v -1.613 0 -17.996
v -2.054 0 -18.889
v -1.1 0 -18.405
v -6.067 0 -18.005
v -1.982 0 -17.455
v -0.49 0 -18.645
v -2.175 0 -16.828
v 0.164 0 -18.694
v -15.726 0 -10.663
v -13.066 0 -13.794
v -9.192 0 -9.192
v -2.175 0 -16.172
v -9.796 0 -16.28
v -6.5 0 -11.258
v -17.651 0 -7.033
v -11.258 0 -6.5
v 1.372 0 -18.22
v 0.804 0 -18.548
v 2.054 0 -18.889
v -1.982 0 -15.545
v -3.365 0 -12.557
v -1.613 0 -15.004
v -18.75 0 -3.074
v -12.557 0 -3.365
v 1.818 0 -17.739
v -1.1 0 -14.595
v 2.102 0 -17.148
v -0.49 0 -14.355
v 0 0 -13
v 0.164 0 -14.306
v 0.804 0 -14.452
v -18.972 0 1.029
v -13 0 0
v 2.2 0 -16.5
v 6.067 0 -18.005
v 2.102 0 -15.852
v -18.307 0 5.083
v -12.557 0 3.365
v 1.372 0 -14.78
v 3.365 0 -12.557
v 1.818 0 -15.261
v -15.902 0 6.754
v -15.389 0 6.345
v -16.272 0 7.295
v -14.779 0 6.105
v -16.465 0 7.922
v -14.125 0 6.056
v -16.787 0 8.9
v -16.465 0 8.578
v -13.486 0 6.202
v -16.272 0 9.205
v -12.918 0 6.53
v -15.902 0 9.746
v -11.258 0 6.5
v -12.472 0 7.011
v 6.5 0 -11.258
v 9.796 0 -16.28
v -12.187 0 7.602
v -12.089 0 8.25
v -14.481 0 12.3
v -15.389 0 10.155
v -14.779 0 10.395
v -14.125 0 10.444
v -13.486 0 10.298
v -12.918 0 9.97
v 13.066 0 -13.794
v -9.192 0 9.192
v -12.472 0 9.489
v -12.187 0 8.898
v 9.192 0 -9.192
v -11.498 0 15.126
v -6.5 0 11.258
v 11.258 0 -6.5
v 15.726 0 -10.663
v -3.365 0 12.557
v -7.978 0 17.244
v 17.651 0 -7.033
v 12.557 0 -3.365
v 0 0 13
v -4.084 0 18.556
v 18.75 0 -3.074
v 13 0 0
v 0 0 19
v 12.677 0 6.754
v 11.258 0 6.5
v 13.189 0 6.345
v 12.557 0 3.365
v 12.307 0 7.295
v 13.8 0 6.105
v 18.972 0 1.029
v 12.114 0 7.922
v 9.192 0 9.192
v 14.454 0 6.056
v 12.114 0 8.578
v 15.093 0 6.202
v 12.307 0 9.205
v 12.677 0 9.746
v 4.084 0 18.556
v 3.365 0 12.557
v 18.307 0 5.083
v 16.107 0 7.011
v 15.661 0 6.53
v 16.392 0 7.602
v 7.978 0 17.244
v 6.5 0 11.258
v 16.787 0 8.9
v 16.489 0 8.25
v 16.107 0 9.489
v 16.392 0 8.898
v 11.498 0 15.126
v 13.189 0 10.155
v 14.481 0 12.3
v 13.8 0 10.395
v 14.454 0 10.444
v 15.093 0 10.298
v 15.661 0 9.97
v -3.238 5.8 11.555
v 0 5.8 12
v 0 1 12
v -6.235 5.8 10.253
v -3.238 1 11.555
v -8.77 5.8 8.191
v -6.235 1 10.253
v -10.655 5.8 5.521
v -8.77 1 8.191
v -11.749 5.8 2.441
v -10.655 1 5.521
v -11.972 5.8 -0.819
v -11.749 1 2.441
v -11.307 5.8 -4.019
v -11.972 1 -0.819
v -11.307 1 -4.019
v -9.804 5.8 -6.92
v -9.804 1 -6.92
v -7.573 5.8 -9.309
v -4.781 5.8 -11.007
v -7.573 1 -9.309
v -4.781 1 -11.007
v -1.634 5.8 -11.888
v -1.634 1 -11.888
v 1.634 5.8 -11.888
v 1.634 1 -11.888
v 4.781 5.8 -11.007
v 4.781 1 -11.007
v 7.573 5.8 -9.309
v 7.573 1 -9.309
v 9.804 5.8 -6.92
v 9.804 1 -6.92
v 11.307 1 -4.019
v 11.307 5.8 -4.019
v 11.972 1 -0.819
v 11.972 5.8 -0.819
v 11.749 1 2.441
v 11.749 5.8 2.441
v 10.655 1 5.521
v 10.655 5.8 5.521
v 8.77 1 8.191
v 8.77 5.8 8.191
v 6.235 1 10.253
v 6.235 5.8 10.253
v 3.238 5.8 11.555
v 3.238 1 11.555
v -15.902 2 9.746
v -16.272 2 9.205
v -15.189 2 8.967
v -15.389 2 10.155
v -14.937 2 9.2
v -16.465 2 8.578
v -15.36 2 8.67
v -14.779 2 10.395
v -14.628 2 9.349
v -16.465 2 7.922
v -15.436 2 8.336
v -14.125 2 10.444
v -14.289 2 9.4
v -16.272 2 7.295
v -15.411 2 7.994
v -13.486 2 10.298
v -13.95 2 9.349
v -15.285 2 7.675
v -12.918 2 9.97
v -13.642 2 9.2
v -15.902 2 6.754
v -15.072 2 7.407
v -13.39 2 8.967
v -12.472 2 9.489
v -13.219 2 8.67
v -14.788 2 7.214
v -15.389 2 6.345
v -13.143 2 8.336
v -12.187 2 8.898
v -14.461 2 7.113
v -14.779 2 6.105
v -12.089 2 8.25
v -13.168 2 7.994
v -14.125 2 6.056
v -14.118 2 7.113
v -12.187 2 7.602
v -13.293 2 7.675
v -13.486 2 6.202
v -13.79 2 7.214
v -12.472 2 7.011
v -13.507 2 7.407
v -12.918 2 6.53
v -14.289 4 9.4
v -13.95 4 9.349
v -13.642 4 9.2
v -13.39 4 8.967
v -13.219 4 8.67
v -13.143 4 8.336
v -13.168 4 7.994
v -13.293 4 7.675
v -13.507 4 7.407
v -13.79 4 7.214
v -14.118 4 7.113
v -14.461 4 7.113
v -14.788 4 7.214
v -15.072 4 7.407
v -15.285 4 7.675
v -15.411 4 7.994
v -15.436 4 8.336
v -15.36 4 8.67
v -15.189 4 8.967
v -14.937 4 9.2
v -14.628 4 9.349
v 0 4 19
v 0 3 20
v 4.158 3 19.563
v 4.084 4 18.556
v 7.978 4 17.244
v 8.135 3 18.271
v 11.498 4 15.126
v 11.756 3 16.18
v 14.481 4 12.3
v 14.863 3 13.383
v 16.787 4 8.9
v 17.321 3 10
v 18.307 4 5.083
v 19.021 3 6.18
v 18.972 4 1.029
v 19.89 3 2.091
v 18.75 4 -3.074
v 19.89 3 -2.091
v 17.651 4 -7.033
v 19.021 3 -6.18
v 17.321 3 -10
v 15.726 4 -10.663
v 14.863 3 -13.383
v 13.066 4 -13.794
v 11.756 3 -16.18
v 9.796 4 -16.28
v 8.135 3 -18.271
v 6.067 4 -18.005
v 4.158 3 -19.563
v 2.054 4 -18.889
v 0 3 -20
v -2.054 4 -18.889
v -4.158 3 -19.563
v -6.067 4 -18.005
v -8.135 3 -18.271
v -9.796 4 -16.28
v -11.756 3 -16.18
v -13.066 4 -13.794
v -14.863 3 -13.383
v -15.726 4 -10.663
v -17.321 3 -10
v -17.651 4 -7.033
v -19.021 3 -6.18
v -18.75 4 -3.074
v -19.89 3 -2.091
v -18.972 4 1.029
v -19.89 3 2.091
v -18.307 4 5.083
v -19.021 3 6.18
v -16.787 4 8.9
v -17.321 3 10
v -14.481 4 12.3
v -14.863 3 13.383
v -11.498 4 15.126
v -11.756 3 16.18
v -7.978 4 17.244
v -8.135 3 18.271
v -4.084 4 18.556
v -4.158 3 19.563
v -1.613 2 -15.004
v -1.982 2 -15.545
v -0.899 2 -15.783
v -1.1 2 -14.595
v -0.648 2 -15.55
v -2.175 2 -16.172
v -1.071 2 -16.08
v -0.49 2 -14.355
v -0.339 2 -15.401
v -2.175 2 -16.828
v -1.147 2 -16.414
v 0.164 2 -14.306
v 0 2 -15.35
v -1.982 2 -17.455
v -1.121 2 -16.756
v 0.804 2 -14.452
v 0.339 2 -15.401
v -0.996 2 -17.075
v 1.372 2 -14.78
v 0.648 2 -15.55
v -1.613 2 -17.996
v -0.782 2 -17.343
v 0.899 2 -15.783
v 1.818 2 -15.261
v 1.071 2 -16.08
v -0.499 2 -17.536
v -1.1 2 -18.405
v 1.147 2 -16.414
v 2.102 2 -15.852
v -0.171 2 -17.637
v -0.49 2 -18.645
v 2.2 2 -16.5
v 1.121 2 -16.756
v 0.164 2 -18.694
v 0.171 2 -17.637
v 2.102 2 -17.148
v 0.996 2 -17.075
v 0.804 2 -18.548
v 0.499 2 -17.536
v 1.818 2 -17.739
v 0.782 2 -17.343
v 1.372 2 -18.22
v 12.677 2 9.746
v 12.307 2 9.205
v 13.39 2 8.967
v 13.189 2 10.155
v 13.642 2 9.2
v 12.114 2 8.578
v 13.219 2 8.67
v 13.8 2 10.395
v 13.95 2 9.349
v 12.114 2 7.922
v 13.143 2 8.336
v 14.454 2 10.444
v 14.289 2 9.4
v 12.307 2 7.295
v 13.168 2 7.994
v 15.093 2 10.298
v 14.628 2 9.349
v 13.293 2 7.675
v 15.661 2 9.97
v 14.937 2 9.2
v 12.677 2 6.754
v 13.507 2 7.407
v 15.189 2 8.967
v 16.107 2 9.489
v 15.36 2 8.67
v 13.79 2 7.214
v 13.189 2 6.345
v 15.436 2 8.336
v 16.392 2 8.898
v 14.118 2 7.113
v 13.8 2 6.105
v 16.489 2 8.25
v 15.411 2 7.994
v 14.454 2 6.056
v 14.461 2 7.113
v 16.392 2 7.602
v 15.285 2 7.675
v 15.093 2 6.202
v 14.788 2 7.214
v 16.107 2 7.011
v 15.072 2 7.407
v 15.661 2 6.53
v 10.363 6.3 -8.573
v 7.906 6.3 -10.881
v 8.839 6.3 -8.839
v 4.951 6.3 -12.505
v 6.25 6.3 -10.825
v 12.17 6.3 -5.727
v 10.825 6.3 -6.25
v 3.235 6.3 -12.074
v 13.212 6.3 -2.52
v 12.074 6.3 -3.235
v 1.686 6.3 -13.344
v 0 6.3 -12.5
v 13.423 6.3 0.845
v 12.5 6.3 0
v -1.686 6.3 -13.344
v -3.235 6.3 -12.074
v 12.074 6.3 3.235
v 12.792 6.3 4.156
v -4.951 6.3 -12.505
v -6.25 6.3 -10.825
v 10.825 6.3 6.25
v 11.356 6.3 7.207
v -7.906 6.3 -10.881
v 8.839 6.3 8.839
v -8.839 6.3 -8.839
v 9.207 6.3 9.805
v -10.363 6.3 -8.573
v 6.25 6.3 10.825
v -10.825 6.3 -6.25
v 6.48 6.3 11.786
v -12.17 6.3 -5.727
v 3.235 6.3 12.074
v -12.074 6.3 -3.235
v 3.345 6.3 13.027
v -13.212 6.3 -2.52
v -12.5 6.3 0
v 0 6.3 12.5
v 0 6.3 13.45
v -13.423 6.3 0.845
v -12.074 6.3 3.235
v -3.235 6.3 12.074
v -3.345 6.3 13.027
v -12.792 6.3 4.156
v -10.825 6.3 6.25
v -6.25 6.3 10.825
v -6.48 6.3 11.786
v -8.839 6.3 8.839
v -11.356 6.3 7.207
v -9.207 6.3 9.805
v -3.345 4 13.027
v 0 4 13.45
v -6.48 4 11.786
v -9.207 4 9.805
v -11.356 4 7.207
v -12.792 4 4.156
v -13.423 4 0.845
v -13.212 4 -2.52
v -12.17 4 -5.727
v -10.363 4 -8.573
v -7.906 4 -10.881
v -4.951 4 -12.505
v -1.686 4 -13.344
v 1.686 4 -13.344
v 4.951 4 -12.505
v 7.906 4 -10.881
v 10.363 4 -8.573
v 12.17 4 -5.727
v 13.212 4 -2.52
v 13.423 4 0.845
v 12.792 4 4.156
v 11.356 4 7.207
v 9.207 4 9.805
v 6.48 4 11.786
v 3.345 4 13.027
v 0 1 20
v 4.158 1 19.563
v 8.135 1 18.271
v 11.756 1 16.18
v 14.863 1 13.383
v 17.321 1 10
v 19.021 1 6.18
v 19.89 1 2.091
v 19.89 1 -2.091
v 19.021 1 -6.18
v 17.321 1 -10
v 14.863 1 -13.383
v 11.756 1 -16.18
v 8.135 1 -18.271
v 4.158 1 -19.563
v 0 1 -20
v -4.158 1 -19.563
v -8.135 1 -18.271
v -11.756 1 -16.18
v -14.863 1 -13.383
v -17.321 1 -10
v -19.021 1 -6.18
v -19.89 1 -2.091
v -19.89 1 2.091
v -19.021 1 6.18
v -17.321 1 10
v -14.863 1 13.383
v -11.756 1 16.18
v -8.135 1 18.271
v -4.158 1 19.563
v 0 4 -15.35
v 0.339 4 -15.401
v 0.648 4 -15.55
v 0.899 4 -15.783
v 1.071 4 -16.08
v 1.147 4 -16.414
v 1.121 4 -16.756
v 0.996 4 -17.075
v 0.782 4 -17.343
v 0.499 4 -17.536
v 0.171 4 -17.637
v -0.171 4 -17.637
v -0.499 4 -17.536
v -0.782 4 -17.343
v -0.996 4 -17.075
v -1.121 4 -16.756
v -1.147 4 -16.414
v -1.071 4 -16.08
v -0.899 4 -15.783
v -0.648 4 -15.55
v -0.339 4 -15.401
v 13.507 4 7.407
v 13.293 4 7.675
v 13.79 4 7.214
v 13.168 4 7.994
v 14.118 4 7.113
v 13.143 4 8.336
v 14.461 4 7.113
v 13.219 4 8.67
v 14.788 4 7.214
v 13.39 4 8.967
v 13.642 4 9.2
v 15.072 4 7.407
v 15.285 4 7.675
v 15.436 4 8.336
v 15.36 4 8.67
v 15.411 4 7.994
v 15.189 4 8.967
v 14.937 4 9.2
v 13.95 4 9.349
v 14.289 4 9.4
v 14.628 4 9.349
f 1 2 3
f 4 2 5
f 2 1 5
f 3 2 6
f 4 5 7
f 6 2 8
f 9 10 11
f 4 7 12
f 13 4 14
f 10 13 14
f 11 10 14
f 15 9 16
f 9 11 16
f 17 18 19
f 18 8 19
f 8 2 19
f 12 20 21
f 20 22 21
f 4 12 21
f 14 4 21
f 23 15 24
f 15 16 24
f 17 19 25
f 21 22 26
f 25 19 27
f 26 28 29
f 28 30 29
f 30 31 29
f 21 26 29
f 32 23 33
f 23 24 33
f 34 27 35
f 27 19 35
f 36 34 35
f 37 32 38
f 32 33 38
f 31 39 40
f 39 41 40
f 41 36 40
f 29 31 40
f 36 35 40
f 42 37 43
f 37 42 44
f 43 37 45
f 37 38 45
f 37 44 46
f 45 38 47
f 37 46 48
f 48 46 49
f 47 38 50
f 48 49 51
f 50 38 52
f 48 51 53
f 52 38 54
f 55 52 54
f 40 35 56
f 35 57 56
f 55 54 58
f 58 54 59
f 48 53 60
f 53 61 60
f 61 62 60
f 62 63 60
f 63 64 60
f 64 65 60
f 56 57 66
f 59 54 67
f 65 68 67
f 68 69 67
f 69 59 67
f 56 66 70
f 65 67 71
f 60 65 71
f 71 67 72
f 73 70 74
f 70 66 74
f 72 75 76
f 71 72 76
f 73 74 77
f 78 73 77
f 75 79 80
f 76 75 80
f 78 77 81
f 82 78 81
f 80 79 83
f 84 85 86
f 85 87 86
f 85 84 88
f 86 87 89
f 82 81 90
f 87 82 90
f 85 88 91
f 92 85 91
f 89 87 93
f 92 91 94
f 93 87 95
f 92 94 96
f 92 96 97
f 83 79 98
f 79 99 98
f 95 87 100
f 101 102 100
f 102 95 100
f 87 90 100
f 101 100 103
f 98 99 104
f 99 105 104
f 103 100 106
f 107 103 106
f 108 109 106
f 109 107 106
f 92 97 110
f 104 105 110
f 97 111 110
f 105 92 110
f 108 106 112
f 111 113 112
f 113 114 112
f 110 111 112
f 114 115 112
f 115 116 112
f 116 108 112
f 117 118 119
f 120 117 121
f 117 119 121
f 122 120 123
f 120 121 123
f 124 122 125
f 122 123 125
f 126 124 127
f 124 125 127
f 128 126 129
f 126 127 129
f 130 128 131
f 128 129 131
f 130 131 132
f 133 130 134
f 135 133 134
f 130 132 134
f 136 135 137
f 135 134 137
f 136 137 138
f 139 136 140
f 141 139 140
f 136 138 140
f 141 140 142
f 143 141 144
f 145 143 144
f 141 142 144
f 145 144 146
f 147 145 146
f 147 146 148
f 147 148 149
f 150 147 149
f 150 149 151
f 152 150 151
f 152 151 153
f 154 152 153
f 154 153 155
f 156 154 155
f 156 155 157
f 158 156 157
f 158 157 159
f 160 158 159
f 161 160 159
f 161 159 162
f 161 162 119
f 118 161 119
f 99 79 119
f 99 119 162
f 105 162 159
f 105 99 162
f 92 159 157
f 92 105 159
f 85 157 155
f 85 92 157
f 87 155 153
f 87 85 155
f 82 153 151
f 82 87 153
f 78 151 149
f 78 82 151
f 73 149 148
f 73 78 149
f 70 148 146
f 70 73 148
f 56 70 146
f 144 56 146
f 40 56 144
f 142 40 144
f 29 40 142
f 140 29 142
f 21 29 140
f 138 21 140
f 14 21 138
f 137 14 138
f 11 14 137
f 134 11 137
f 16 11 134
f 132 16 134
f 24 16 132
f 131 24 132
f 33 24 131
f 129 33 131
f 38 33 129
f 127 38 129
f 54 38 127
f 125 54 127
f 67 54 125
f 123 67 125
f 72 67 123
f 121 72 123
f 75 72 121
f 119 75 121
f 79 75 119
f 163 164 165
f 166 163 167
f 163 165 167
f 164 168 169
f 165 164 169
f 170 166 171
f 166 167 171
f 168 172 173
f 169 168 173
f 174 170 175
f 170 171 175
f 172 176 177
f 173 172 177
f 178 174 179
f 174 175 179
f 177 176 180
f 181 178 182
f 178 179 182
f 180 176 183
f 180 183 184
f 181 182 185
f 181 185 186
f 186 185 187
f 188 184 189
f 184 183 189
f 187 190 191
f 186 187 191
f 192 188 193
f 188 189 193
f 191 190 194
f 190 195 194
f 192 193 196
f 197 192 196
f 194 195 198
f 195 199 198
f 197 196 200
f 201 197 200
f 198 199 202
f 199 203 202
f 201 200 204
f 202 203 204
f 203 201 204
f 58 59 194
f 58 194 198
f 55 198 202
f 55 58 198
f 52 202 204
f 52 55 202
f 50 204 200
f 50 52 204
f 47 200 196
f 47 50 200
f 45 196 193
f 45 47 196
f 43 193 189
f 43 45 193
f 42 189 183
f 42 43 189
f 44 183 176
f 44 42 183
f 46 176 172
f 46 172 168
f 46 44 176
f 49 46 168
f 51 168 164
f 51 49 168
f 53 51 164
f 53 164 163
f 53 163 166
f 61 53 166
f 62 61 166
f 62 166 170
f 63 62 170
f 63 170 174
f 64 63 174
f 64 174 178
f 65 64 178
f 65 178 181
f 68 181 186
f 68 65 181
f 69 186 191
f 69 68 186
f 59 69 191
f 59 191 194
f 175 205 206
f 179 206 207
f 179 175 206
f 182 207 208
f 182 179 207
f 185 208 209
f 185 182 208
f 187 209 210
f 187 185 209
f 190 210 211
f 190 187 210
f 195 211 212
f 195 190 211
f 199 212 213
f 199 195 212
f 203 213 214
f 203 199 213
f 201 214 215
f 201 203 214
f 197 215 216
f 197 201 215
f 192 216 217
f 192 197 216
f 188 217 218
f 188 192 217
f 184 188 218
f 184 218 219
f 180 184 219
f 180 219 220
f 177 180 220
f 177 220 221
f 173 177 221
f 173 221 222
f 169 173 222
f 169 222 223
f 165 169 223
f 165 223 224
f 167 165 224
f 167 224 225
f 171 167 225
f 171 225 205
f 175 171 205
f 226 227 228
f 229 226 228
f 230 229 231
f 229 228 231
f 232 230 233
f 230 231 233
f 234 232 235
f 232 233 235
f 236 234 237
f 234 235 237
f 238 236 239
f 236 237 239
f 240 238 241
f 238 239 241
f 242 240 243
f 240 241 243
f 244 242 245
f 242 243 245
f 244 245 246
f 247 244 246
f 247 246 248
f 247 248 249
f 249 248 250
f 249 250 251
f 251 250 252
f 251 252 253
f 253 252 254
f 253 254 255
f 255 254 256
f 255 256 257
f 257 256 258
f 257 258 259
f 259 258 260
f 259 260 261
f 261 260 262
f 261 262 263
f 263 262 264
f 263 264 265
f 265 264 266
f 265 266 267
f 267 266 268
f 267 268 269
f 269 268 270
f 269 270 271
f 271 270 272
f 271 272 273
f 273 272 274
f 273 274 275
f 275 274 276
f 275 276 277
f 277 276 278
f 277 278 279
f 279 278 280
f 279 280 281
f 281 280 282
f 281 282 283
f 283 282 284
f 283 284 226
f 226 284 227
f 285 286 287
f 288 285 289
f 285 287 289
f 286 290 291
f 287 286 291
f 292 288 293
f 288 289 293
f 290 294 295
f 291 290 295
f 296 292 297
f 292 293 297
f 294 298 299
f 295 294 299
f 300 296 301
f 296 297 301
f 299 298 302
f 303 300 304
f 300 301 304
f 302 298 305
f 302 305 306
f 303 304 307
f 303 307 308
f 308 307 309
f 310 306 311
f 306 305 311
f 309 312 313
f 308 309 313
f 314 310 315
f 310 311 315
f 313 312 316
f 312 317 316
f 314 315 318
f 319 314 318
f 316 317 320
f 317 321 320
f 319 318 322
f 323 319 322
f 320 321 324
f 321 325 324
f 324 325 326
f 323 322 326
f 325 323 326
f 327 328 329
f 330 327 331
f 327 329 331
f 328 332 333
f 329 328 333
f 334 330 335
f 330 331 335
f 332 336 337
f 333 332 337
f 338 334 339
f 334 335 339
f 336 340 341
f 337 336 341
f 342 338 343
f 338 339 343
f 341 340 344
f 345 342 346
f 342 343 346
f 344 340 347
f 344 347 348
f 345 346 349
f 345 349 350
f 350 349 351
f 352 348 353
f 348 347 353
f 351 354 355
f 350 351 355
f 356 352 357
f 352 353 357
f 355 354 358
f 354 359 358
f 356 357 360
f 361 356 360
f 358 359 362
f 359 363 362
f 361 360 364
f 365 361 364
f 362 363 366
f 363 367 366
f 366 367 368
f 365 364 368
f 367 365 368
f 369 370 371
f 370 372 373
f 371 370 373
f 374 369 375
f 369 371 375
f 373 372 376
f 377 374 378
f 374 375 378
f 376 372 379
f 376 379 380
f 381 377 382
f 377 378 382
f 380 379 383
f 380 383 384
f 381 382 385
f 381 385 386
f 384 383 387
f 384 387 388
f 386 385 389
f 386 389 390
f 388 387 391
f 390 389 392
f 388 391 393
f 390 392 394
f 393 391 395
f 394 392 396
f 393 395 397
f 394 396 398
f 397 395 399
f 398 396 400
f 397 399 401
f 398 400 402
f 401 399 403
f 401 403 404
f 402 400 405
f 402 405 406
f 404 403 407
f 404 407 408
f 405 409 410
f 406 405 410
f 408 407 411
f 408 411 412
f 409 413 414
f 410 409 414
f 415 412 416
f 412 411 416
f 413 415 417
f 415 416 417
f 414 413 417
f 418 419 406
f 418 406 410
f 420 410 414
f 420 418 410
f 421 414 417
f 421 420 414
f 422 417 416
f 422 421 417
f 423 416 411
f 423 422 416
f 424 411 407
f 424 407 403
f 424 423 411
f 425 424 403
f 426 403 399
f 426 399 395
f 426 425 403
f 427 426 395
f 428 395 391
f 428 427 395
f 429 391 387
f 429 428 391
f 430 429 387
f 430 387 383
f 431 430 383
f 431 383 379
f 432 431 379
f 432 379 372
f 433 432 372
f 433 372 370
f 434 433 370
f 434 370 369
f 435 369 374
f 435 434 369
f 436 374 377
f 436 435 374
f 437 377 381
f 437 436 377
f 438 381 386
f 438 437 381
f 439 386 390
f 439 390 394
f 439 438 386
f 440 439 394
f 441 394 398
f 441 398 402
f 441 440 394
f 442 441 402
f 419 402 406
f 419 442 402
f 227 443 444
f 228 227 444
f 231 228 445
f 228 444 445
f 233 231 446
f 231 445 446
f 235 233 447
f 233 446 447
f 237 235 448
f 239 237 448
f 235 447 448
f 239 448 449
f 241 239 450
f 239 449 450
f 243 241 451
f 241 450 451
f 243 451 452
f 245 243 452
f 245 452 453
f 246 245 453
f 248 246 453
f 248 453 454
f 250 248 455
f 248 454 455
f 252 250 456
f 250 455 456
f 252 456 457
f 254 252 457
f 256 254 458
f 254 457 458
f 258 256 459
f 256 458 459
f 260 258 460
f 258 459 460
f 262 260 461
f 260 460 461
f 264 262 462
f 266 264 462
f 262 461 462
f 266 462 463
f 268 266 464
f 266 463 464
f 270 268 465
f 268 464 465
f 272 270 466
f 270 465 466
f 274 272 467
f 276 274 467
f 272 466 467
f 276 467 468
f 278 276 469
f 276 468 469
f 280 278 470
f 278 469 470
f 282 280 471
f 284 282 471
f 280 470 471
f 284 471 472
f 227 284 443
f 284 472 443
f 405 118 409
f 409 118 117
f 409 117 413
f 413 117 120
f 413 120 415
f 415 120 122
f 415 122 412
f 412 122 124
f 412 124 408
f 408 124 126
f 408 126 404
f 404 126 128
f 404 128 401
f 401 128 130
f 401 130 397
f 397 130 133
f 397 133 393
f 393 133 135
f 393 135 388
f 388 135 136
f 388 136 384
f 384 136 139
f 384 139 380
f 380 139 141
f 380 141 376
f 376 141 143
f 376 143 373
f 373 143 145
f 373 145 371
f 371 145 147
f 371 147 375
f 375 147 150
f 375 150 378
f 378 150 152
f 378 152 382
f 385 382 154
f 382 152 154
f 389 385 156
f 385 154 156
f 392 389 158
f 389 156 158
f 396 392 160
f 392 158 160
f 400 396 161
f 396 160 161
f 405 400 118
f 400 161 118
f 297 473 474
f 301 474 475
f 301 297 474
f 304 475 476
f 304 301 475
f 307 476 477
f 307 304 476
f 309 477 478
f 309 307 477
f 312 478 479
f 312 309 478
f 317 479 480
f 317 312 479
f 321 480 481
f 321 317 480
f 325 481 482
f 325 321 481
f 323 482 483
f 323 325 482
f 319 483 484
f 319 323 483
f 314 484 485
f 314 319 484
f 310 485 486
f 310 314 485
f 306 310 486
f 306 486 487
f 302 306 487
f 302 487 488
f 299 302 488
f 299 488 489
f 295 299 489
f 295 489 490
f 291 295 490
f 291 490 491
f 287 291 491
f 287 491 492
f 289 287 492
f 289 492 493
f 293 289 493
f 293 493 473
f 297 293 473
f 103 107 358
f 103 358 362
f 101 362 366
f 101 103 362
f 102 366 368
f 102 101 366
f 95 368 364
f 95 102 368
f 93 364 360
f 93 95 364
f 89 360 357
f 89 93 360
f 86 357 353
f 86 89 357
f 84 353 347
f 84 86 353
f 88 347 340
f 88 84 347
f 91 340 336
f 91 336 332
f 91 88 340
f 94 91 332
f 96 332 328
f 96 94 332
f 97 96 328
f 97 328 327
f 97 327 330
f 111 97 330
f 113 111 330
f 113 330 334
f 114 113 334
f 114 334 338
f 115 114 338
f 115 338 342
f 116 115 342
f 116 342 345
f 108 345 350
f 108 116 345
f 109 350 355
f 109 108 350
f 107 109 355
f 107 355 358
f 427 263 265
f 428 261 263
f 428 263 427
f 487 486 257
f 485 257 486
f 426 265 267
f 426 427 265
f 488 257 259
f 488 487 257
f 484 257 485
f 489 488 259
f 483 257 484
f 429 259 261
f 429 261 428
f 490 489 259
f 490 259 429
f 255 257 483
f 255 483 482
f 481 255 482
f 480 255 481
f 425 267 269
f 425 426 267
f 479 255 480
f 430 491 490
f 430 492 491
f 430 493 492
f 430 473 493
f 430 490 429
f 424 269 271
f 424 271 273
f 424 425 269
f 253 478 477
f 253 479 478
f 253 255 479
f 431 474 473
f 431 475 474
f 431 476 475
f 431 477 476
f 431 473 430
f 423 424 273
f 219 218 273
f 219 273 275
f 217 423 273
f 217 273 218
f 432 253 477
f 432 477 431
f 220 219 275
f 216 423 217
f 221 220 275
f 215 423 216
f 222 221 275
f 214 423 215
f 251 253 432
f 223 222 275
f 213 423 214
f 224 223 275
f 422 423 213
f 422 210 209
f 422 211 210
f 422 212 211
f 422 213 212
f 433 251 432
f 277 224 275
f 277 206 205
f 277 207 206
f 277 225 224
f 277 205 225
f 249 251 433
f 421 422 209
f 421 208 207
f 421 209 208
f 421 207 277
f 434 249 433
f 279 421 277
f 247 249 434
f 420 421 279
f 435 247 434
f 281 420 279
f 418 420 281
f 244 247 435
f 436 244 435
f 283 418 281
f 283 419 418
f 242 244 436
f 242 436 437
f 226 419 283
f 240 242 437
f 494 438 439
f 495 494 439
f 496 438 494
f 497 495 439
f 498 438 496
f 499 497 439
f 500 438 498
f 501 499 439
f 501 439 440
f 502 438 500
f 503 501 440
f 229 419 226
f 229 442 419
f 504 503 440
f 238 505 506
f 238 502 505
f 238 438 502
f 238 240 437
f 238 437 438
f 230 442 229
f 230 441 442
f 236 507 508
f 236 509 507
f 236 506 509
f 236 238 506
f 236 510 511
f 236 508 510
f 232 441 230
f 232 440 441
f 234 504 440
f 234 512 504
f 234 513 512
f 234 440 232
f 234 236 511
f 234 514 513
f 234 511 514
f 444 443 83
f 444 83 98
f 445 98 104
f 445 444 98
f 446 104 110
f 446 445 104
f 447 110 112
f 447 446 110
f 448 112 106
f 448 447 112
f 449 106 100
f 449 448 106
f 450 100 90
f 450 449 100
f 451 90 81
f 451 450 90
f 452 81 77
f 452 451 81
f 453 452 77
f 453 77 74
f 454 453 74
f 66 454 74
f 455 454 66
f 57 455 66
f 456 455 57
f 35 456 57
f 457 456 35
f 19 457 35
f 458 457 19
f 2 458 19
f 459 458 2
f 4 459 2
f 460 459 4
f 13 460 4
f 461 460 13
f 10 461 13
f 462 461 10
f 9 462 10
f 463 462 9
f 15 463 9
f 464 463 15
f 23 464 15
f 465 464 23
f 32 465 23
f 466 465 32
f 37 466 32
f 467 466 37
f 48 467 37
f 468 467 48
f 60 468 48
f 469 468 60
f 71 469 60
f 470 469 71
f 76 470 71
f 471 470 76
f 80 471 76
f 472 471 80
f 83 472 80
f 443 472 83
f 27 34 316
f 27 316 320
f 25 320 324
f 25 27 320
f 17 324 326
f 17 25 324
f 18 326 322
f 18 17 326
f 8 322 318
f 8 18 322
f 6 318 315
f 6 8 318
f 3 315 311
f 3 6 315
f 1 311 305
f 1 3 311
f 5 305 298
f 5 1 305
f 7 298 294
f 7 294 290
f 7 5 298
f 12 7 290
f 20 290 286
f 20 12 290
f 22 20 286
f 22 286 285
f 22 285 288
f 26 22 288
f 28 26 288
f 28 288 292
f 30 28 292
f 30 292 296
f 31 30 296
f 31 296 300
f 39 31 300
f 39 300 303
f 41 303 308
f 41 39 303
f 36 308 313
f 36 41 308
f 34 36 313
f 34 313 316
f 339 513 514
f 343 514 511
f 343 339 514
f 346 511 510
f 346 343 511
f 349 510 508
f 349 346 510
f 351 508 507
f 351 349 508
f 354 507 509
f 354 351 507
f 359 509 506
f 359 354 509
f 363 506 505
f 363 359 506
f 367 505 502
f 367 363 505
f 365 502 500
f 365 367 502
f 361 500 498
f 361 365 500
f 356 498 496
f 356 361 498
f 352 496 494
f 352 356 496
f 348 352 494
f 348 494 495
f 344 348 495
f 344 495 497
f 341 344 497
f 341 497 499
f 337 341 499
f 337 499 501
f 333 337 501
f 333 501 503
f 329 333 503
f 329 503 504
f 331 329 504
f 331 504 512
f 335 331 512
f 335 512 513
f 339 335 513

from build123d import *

# Parameters (mm, degrees)
ESQUISSE1_R                = 20
ESQUISSE1_R_2              = 12
ESQUISSE1_R_3              = 1.15
BOSS_EXTRU_1_DEPTH         = 4
PER_AGEAVANC_1_OUTLINE_R   = 2.2
PER_AGEAVANC_1_OUTLINE_R_2 = 1.15
PER_AGEAVANC_1_DEPTH       = 2
BOSS_EXTRU_2_START         = -4
ESQUISSE3_R                = 13.45
ESQUISSE3_R_2              = 12
BOSS_EXTRU_2_DEPTH         = 2.3
CHANFREIN1_SIZE            = 0.5
CHANFREIN2_SIZE            = 1


# Read off the part's stored shape, not the designer's step: PerçageAvancé1
with BuildPart() as part:
    # Esquisse1 → Boss.-Extru.1 (new body)
    with BuildSketch(Plane(origin=(0, 0, 0), x_dir=(1, 0, 0), z_dir=(0, 1, 0))):
        with Locations(Location((0, 0, 0), (0, 0, 270))):
            Circle(ESQUISSE1_R)
        with Locations(Location((0, 0, 0), (0, 0, 270))):
            Circle(ESQUISSE1_R_2, mode=Mode.SUBTRACT)
        with Locations(Location((-14.289419162, -8.25, 0), (0, 0, 270))):
            Circle(ESQUISSE1_R_3, mode=Mode.SUBTRACT)
        with Locations(Location((14.289419162, -8.25, 0), (0, 0, 270))):
            Circle(ESQUISSE1_R_3, mode=Mode.SUBTRACT)
        with Locations(Location((0, 16.5, 0), (0, 0, 270))):
            Circle(ESQUISSE1_R_3, mode=Mode.SUBTRACT)
    extrude(amount=BOSS_EXTRU_1_DEPTH)

    # PerçageAvancé1 outline → PerçageAvancé1 (cut)
    # profile 1 of 3: a face of its own
    with BuildSketch(Plane(origin=(0, 0, 0), x_dir=(1, 0, 0), z_dir=(0, 1, 0))):
        with Locations((-14.289419162, -8.25)):
            Circle(PER_AGEAVANC_1_OUTLINE_R)
        with Locations((-14.289419162, -8.25)):
            Circle(PER_AGEAVANC_1_OUTLINE_R_2, mode=Mode.SUBTRACT)
    # profile 2 of 3: a face of its own
    with BuildSketch(Plane(origin=(0, 0, 0), x_dir=(1, 0, 0), z_dir=(0, 1, 0))):
        with Locations((14.289419162, -8.25)):
            Circle(PER_AGEAVANC_1_OUTLINE_R)
        with Locations((14.289419162, -8.25)):
            Circle(PER_AGEAVANC_1_OUTLINE_R_2, mode=Mode.SUBTRACT)
    # profile 3 of 3: a face of its own
    with BuildSketch(Plane(origin=(0, 0, 0), x_dir=(1, 0, 0), z_dir=(0, 1, 0))):
        with Locations((0, 16.5)):
            Circle(PER_AGEAVANC_1_OUTLINE_R)
        with Locations((0, 16.5)):
            Circle(PER_AGEAVANC_1_OUTLINE_R_2, mode=Mode.SUBTRACT)
    extrude(amount=PER_AGEAVANC_1_DEPTH, mode=Mode.SUBTRACT)

    # Esquisse3 → Boss.-Extru.2 (add)
    with BuildSketch(Plane.XZ.offset(BOSS_EXTRU_2_START)):
        with Locations(Location((0, 0, 0), (0, 0, 90))):
            Circle(ESQUISSE3_R)
        with Locations(Location((0, 0, 0), (0, 0, 90))):
            Circle(ESQUISSE3_R_2, mode=Mode.SUBTRACT)
    extrude(amount=-BOSS_EXTRU_2_DEPTH)

    # Chanfrein1
    chanfrein1_edges = [part.edges().sort_by_distance(p)[0] for p in [
        (0, 6.3, -12),
    ]]
    chamfer(chanfrein1_edges, length=CHANFREIN1_SIZE)

    # Chanfrein2
    chanfrein2_edges = [part.edges().sort_by_distance(p)[0] for p in [
        (0, 4, -20),
        (0, 0, -20),
        (0, 0, -12),
    ]]
    chamfer(chanfrein2_edges, length=CHANFREIN2_SIZE)


solid = part.part
